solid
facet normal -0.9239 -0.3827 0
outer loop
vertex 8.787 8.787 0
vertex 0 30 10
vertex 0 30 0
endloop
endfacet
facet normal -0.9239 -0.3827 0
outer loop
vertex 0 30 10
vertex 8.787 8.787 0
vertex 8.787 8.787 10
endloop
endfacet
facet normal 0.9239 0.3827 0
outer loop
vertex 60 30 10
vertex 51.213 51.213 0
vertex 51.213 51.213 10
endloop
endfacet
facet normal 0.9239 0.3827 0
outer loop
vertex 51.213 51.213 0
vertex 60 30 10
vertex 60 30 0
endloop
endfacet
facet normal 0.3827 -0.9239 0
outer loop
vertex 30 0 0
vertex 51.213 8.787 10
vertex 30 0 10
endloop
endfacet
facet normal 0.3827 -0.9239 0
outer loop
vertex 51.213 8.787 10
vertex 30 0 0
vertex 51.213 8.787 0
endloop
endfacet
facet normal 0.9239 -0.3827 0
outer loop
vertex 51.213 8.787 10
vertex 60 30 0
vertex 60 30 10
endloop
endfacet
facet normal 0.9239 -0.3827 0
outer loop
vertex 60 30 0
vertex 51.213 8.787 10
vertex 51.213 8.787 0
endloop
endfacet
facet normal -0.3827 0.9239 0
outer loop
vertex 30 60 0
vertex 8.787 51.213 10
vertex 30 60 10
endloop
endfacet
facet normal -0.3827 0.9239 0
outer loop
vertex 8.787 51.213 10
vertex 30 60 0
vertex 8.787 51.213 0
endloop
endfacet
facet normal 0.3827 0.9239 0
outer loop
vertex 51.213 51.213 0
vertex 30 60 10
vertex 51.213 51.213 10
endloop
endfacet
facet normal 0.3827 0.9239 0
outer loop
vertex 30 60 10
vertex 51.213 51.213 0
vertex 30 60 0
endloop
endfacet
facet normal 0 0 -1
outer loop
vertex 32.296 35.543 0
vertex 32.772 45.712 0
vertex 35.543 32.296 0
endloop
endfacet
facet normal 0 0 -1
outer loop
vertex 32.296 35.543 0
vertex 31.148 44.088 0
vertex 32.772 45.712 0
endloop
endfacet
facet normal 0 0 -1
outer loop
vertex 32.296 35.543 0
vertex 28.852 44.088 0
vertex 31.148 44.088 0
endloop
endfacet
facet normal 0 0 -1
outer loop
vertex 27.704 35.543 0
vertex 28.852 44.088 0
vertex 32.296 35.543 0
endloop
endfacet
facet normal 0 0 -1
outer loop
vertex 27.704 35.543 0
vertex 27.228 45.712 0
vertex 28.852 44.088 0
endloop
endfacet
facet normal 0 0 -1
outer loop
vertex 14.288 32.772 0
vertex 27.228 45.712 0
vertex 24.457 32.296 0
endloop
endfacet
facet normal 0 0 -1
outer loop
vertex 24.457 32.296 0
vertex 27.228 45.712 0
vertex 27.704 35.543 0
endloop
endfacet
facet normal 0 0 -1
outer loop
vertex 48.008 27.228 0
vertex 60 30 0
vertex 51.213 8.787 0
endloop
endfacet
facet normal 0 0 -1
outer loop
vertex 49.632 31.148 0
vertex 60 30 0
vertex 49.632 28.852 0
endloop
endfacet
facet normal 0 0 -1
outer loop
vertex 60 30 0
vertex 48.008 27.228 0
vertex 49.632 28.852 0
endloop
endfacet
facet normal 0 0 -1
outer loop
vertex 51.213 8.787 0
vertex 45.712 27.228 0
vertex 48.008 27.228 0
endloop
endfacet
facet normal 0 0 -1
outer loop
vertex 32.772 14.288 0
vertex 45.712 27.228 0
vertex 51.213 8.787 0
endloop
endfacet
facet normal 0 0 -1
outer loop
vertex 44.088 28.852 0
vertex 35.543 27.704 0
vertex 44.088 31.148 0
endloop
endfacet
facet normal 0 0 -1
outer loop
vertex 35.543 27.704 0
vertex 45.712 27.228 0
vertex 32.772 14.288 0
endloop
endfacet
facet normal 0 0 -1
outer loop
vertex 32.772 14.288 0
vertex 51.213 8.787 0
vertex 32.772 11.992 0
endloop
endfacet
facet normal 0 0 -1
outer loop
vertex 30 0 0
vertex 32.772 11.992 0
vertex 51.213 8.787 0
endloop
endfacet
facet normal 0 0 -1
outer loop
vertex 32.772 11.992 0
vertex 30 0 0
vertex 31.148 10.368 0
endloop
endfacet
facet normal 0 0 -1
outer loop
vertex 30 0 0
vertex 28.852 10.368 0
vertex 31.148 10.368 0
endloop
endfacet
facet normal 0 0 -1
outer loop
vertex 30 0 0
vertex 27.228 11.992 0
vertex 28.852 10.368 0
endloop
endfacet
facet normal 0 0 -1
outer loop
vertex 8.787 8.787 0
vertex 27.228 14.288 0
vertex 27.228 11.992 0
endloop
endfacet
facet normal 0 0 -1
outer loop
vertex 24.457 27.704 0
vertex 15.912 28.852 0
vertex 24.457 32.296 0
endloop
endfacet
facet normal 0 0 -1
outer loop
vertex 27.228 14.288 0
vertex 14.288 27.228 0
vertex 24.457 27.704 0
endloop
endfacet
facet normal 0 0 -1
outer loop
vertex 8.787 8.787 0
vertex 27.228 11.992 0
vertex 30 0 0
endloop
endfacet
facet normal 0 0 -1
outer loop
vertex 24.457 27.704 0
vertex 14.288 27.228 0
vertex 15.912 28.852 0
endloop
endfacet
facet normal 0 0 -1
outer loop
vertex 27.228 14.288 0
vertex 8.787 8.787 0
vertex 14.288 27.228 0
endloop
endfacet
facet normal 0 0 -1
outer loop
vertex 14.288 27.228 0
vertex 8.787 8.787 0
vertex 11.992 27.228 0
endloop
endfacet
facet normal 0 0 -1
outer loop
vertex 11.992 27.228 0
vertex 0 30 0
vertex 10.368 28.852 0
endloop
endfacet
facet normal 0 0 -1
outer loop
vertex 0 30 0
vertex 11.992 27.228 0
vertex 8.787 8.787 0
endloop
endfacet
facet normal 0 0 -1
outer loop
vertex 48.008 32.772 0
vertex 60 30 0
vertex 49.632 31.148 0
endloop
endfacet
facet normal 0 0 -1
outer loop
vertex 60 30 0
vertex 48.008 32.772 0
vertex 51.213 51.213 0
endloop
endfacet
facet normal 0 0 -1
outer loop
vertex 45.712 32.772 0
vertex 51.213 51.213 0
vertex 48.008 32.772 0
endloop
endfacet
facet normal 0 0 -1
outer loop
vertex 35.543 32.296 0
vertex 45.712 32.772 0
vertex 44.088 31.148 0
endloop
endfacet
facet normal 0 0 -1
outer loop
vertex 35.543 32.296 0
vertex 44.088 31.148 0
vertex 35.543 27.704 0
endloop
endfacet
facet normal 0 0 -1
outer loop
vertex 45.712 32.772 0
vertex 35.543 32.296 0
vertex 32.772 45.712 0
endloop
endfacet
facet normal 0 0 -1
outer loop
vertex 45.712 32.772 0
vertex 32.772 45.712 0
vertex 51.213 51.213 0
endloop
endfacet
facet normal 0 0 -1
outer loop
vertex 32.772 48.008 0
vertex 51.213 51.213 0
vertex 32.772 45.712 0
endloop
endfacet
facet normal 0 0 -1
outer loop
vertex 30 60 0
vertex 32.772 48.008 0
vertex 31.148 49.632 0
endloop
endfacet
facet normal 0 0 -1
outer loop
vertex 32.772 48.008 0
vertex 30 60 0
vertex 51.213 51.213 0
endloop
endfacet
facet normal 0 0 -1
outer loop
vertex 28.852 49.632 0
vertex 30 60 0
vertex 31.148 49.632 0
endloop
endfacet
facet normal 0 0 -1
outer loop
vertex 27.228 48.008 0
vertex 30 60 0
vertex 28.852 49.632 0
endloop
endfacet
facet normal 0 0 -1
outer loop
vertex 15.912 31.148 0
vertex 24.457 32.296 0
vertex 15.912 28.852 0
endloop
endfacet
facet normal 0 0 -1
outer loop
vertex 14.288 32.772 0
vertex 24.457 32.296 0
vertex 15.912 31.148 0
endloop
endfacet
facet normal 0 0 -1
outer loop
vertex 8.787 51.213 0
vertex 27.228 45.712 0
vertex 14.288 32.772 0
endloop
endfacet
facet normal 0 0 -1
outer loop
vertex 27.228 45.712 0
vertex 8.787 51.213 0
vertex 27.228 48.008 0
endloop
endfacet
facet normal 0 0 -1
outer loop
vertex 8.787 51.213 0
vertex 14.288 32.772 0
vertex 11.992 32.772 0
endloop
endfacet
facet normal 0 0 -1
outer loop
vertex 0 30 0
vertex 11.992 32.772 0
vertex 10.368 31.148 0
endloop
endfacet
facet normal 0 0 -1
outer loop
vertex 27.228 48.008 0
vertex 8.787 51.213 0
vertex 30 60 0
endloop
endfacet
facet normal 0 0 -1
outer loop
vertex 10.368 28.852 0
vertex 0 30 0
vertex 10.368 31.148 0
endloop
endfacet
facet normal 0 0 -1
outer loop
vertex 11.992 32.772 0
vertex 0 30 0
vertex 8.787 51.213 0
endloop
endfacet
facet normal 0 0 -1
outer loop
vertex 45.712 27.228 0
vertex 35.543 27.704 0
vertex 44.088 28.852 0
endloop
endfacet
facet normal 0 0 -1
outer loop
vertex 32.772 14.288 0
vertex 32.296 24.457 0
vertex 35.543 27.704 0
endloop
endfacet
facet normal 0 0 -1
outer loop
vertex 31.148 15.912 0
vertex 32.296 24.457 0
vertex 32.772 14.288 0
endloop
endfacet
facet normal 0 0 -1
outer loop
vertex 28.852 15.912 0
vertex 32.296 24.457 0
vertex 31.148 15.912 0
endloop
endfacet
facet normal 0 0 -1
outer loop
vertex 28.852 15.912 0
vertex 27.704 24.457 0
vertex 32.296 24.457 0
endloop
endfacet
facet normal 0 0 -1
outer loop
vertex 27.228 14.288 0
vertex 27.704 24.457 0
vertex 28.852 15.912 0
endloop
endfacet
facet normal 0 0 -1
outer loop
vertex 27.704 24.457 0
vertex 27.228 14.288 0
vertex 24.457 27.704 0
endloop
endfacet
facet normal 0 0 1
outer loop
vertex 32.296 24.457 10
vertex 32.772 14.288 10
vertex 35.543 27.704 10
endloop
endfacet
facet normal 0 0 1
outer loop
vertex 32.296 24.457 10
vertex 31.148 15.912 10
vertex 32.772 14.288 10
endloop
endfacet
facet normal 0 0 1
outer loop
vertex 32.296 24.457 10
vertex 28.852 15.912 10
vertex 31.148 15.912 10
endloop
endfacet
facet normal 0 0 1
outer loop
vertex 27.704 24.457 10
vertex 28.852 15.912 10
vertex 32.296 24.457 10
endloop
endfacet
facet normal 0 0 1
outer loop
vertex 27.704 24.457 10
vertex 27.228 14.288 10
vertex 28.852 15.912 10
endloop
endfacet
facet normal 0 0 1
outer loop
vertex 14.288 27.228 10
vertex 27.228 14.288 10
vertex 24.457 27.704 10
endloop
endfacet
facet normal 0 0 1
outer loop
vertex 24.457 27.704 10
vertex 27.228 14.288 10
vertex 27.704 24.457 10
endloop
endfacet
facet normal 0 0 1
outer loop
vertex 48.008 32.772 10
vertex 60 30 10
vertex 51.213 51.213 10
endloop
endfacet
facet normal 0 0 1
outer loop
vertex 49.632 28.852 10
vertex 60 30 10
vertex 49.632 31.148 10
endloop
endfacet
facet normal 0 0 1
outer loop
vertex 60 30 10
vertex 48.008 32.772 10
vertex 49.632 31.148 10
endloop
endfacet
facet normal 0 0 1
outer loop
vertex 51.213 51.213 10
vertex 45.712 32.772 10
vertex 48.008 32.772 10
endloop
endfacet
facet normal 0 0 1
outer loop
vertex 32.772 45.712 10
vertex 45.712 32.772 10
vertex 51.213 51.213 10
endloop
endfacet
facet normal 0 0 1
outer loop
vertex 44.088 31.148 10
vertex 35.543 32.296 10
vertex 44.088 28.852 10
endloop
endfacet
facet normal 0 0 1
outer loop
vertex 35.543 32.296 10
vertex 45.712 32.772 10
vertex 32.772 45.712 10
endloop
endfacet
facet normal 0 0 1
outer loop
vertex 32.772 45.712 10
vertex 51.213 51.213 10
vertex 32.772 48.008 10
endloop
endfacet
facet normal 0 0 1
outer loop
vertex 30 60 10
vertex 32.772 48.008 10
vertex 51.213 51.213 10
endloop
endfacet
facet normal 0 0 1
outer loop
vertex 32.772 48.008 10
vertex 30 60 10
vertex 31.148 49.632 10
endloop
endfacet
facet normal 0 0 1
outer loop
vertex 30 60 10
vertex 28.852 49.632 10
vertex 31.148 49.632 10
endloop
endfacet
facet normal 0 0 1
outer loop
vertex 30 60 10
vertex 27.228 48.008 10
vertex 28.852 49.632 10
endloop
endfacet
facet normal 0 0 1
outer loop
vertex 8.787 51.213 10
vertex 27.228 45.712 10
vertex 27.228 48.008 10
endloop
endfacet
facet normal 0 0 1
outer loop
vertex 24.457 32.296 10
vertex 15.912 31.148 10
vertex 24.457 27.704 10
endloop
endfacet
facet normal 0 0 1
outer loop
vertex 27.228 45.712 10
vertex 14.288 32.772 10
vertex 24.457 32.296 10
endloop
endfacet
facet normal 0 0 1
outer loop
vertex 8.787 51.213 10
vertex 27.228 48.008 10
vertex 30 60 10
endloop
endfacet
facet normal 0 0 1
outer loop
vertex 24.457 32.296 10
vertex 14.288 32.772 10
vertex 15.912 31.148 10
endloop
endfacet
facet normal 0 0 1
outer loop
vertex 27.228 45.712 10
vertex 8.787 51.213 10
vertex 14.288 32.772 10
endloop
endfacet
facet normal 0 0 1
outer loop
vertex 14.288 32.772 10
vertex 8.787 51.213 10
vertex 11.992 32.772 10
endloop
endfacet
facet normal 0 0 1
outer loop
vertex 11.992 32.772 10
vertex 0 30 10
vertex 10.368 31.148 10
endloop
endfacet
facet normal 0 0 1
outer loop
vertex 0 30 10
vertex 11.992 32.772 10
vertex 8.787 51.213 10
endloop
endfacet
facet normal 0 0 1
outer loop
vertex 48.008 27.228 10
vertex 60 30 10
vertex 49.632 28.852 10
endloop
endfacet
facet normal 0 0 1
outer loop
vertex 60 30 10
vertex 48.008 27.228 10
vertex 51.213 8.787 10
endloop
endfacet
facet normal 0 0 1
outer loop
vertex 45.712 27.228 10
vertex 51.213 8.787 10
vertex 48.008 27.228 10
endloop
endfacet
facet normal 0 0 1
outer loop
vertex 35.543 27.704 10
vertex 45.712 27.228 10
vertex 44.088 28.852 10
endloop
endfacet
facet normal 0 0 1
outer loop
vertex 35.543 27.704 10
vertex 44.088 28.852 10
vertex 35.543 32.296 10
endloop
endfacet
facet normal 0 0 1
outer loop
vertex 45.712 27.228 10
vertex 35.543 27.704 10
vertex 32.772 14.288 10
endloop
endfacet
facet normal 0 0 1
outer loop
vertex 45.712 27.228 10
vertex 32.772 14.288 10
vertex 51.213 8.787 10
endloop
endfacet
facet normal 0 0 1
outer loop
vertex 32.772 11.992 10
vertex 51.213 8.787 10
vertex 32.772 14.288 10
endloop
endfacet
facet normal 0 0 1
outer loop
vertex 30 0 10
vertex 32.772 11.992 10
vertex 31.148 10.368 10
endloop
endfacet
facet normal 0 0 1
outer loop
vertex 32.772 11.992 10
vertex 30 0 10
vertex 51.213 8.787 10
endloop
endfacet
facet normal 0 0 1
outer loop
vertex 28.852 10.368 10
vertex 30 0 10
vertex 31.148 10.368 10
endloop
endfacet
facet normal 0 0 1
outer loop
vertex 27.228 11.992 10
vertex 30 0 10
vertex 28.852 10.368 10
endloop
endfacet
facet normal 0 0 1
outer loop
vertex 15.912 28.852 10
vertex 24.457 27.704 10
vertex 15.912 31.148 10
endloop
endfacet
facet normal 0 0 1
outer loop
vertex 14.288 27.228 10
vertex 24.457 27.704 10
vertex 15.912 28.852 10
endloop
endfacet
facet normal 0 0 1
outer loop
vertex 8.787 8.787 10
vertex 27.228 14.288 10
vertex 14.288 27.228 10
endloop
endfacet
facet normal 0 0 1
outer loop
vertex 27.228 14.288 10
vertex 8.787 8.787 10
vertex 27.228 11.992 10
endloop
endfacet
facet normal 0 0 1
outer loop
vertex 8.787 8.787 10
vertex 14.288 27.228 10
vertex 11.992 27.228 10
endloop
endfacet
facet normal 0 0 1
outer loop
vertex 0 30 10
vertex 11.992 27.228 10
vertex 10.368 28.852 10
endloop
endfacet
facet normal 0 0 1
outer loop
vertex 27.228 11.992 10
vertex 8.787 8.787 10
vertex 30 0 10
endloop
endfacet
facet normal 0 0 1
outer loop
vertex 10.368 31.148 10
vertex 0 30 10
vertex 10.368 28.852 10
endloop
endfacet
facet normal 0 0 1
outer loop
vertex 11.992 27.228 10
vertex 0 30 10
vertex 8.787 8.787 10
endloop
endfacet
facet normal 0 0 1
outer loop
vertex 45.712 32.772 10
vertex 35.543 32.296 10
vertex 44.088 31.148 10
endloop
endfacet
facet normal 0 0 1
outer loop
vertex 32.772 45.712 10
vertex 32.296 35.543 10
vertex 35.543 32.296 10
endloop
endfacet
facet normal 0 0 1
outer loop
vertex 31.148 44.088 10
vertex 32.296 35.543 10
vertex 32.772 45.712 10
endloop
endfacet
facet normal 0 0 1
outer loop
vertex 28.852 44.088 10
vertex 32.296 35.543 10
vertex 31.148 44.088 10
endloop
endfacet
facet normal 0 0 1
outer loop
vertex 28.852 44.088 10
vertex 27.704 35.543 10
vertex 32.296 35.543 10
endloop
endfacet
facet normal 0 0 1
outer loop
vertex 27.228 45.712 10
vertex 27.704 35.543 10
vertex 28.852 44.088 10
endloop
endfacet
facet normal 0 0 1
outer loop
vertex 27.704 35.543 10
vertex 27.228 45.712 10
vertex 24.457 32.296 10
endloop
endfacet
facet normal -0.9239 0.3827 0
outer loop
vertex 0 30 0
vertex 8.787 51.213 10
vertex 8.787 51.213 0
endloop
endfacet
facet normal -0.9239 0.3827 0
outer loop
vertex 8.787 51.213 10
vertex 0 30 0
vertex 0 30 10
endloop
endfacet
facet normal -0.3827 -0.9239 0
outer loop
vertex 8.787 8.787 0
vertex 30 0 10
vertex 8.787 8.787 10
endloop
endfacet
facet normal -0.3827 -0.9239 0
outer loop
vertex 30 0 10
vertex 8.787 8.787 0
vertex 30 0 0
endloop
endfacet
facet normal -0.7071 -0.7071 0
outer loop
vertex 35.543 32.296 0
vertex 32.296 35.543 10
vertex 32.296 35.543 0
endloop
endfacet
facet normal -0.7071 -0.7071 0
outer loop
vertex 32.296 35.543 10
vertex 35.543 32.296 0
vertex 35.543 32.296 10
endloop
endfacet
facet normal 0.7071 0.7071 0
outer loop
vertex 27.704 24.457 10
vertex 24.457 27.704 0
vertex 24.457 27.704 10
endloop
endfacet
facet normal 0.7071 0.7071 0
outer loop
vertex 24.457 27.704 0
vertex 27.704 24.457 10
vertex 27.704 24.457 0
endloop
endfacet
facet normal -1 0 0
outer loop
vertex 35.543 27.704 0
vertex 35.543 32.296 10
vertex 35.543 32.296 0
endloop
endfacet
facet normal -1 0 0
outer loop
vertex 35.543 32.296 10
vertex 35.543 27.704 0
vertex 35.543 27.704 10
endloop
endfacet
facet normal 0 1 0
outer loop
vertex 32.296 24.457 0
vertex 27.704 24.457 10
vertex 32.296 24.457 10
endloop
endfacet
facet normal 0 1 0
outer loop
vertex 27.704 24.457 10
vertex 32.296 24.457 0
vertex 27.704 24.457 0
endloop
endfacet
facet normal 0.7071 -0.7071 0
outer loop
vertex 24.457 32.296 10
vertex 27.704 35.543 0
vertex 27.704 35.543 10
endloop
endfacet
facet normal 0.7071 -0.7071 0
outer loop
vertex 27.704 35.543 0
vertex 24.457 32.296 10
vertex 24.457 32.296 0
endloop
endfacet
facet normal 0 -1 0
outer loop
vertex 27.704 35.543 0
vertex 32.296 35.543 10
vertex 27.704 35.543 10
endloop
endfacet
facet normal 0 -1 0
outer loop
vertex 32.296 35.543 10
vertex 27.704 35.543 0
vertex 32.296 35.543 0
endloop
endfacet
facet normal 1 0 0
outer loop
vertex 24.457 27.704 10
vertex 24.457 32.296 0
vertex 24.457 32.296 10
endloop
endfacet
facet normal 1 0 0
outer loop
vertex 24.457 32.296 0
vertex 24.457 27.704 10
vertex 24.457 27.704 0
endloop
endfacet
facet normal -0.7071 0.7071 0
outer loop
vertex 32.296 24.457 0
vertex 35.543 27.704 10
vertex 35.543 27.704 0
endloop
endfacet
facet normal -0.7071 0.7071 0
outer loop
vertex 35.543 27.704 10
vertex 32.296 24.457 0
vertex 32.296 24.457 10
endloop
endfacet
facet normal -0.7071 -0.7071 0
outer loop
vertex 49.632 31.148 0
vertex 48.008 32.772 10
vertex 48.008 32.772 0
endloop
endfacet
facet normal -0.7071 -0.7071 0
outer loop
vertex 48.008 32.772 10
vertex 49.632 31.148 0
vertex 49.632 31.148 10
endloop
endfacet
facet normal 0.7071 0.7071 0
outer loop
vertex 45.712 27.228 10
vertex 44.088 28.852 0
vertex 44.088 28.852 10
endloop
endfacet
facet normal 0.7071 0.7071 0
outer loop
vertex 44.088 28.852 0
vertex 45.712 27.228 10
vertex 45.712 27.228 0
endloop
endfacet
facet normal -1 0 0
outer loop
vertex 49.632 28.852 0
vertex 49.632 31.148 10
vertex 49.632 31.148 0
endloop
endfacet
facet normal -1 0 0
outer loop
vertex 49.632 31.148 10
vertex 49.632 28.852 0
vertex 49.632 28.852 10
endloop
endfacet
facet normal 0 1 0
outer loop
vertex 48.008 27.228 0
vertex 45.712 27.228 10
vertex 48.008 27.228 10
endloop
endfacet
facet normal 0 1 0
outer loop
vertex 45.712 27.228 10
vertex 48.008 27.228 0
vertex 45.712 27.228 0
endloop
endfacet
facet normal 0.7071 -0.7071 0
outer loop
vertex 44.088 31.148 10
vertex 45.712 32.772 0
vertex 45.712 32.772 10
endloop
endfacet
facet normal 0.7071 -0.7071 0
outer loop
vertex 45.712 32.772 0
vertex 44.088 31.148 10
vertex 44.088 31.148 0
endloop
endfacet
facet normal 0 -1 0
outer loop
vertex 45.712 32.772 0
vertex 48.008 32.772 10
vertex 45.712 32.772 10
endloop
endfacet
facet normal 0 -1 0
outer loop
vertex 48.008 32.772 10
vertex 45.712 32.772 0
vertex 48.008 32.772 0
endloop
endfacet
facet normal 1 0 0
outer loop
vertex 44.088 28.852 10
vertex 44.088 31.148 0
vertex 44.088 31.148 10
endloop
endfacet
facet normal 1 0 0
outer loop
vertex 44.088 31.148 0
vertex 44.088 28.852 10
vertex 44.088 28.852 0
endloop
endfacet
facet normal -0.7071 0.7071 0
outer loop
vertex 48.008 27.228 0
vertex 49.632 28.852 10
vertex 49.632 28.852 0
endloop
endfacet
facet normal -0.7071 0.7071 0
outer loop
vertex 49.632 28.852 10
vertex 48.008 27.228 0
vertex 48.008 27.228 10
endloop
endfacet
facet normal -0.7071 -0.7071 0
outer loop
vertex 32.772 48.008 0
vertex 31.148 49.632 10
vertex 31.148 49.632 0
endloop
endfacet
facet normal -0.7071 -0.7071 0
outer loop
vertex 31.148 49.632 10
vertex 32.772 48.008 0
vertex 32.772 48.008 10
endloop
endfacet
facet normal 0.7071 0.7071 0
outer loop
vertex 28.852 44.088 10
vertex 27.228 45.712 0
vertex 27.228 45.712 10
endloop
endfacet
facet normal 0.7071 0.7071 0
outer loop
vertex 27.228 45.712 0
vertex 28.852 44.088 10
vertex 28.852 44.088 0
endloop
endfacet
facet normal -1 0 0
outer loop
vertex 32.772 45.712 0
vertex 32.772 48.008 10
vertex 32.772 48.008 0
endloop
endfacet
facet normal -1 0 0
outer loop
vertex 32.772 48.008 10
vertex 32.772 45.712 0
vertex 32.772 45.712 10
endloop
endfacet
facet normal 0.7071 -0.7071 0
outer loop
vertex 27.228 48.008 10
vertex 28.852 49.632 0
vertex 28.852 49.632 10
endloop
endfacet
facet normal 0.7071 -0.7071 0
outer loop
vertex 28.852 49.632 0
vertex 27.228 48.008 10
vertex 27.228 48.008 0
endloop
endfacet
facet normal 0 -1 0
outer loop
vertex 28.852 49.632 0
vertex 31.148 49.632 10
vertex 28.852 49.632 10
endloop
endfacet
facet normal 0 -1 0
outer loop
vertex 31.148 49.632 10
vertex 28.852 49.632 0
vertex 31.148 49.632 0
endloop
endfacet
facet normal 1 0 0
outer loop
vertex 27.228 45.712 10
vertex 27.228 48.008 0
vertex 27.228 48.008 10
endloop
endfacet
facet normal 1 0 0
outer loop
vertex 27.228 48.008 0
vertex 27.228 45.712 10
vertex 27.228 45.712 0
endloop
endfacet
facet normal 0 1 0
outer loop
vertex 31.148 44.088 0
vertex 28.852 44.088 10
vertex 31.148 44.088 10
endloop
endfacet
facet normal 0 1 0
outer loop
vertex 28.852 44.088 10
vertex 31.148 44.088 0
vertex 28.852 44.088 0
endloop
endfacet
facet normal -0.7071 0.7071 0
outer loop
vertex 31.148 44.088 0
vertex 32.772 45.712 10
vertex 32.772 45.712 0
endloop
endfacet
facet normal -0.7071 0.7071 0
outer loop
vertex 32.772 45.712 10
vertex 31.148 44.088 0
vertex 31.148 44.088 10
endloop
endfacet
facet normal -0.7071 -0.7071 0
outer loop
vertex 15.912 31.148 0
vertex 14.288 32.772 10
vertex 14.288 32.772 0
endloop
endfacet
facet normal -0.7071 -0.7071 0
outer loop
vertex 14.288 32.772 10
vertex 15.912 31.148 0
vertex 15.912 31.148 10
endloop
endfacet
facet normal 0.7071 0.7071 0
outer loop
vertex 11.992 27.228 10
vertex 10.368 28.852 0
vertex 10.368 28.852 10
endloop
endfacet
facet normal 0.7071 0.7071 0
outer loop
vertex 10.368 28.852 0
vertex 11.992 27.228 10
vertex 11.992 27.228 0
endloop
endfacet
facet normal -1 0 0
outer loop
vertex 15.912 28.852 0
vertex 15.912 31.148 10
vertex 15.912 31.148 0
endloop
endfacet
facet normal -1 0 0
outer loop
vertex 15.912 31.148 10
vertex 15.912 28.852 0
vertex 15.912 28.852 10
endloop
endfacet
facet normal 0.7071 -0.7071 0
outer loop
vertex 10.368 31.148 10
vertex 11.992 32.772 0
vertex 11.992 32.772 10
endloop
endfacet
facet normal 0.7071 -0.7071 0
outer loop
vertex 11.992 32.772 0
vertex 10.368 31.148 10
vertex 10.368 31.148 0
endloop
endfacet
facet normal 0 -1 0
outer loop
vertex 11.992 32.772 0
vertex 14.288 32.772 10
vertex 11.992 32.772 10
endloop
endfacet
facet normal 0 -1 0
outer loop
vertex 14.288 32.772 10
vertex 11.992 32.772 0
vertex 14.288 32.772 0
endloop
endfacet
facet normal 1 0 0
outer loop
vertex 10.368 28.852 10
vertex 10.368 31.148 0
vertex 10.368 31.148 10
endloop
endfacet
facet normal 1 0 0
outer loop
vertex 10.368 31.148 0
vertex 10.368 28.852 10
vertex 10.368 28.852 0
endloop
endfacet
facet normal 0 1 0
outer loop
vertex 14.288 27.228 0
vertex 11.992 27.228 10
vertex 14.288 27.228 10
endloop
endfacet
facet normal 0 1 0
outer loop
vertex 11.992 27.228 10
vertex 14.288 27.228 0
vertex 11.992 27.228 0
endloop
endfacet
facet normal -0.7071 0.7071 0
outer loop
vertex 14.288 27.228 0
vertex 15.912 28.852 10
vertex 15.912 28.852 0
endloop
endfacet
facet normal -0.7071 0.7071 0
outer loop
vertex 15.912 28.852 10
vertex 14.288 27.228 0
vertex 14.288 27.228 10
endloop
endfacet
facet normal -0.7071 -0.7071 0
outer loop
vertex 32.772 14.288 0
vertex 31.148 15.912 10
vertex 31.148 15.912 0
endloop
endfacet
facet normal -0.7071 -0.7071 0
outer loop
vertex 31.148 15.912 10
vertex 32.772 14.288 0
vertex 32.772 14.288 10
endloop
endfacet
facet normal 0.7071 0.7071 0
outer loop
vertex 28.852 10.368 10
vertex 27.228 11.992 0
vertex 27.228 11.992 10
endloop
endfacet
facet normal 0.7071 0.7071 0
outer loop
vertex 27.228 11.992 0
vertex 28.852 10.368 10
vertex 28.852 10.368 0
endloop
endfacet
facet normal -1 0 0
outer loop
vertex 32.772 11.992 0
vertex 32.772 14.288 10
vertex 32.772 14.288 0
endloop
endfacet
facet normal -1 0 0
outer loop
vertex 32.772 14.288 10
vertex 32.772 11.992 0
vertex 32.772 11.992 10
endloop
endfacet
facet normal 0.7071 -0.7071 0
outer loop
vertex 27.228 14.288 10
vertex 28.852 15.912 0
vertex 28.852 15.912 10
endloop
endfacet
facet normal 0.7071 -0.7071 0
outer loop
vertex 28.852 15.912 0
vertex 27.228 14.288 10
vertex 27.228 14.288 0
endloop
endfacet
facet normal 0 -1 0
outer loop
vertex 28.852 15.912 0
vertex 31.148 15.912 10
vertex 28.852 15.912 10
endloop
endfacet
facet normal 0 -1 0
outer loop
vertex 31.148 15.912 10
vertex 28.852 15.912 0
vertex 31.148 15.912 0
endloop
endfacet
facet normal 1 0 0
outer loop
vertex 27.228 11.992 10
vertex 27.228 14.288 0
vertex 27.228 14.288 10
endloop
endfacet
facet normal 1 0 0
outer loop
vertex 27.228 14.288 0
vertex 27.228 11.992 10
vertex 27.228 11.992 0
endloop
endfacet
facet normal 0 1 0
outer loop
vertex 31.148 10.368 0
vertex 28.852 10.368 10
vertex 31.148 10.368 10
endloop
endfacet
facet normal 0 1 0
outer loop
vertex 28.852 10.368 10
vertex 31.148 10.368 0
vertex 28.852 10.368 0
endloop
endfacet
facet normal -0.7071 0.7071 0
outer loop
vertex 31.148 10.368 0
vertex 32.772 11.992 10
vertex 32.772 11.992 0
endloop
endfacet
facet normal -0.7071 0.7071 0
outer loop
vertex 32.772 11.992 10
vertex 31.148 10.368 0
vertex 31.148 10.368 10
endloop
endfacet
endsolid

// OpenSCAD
$fn = 32;

// ----------------------------------------------------------------------
// Polygon plate: 8-gon R30, 4 bolt windows
// ----------------------------------------------------------------------

// --- parameters (mm) ---
sides = 8;                // number of polygon sides
plate_r = 30;             // circumscribed radius of the polygon
bore_r = 6;               // centre bore radius
bolts = 4;                // number of bolt windows
ring_r = 16.86;           // bolt-circle radius
bolt_r = 3;               // bolt window radius
plate_t = 10;             // plate thickness, Z (extrusion height)

plate_d = 2 * plate_r;  // circumscribed diameter
bore_d = 2 * bore_r;  // centre bore diameter
bolt_d = 2 * bolt_r;  // bolt window diameter
ring_d = 2 * ring_r;  // bolt-circle diameter

profile = [[60, 30], [51.213, 51.213], [30, 60], [8.787, 51.213], [0, 30], [8.787, 8.787], [30, 0], [51.213, 8.787]];  // primary outline, 8 points, counter clockwise
void_1 = [[35.543, 32.296], [32.296, 35.543], [27.704, 35.543], [24.457, 32.296], [24.457, 27.704], [27.704, 24.457], [32.296, 24.457], [35.543, 27.704]];  // centre bore, 8 points
void_2 = [[49.632, 31.148], [48.008, 32.772], [45.712, 32.772], [44.088, 31.148], [44.088, 28.852], [45.712, 27.228], [48.008, 27.228], [49.632, 28.852]];  // bolt window 1, 8 points
void_3 = [[32.772, 48.008], [31.148, 49.632], [28.852, 49.632], [27.228, 48.008], [27.228, 45.712], [28.852, 44.088], [31.148, 44.088], [32.772, 45.712]];  // bolt window 2, 8 points
void_4 = [[15.912, 31.148], [14.288, 32.772], [11.992, 32.772], [10.368, 31.148], [10.368, 28.852], [11.992, 27.228], [14.288, 27.228], [15.912, 28.852]];  // bolt window 3, 8 points
void_5 = [[32.772, 14.288], [31.148, 15.912], [28.852, 15.912], [27.228, 14.288], [27.228, 11.992], [28.852, 10.368], [31.148, 10.368], [32.772, 11.992]];  // bolt window 4, 8 points

// --- the one profile operation ---
difference() {
  linear_extrude(height = plate_t) polygon(points = profile);
  translate([0, 0, -1])
    linear_extrude(height = plate_t + 2) polygon(points = void_1);
  translate([0, 0, -1])
    linear_extrude(height = plate_t + 2) polygon(points = void_2);
  translate([0, 0, -1])
    linear_extrude(height = plate_t + 2) polygon(points = void_3);
  translate([0, 0, -1])
    linear_extrude(height = plate_t + 2) polygon(points = void_4);
  translate([0, 0, -1])
    linear_extrude(height = plate_t + 2) polygon(points = void_5);
}
